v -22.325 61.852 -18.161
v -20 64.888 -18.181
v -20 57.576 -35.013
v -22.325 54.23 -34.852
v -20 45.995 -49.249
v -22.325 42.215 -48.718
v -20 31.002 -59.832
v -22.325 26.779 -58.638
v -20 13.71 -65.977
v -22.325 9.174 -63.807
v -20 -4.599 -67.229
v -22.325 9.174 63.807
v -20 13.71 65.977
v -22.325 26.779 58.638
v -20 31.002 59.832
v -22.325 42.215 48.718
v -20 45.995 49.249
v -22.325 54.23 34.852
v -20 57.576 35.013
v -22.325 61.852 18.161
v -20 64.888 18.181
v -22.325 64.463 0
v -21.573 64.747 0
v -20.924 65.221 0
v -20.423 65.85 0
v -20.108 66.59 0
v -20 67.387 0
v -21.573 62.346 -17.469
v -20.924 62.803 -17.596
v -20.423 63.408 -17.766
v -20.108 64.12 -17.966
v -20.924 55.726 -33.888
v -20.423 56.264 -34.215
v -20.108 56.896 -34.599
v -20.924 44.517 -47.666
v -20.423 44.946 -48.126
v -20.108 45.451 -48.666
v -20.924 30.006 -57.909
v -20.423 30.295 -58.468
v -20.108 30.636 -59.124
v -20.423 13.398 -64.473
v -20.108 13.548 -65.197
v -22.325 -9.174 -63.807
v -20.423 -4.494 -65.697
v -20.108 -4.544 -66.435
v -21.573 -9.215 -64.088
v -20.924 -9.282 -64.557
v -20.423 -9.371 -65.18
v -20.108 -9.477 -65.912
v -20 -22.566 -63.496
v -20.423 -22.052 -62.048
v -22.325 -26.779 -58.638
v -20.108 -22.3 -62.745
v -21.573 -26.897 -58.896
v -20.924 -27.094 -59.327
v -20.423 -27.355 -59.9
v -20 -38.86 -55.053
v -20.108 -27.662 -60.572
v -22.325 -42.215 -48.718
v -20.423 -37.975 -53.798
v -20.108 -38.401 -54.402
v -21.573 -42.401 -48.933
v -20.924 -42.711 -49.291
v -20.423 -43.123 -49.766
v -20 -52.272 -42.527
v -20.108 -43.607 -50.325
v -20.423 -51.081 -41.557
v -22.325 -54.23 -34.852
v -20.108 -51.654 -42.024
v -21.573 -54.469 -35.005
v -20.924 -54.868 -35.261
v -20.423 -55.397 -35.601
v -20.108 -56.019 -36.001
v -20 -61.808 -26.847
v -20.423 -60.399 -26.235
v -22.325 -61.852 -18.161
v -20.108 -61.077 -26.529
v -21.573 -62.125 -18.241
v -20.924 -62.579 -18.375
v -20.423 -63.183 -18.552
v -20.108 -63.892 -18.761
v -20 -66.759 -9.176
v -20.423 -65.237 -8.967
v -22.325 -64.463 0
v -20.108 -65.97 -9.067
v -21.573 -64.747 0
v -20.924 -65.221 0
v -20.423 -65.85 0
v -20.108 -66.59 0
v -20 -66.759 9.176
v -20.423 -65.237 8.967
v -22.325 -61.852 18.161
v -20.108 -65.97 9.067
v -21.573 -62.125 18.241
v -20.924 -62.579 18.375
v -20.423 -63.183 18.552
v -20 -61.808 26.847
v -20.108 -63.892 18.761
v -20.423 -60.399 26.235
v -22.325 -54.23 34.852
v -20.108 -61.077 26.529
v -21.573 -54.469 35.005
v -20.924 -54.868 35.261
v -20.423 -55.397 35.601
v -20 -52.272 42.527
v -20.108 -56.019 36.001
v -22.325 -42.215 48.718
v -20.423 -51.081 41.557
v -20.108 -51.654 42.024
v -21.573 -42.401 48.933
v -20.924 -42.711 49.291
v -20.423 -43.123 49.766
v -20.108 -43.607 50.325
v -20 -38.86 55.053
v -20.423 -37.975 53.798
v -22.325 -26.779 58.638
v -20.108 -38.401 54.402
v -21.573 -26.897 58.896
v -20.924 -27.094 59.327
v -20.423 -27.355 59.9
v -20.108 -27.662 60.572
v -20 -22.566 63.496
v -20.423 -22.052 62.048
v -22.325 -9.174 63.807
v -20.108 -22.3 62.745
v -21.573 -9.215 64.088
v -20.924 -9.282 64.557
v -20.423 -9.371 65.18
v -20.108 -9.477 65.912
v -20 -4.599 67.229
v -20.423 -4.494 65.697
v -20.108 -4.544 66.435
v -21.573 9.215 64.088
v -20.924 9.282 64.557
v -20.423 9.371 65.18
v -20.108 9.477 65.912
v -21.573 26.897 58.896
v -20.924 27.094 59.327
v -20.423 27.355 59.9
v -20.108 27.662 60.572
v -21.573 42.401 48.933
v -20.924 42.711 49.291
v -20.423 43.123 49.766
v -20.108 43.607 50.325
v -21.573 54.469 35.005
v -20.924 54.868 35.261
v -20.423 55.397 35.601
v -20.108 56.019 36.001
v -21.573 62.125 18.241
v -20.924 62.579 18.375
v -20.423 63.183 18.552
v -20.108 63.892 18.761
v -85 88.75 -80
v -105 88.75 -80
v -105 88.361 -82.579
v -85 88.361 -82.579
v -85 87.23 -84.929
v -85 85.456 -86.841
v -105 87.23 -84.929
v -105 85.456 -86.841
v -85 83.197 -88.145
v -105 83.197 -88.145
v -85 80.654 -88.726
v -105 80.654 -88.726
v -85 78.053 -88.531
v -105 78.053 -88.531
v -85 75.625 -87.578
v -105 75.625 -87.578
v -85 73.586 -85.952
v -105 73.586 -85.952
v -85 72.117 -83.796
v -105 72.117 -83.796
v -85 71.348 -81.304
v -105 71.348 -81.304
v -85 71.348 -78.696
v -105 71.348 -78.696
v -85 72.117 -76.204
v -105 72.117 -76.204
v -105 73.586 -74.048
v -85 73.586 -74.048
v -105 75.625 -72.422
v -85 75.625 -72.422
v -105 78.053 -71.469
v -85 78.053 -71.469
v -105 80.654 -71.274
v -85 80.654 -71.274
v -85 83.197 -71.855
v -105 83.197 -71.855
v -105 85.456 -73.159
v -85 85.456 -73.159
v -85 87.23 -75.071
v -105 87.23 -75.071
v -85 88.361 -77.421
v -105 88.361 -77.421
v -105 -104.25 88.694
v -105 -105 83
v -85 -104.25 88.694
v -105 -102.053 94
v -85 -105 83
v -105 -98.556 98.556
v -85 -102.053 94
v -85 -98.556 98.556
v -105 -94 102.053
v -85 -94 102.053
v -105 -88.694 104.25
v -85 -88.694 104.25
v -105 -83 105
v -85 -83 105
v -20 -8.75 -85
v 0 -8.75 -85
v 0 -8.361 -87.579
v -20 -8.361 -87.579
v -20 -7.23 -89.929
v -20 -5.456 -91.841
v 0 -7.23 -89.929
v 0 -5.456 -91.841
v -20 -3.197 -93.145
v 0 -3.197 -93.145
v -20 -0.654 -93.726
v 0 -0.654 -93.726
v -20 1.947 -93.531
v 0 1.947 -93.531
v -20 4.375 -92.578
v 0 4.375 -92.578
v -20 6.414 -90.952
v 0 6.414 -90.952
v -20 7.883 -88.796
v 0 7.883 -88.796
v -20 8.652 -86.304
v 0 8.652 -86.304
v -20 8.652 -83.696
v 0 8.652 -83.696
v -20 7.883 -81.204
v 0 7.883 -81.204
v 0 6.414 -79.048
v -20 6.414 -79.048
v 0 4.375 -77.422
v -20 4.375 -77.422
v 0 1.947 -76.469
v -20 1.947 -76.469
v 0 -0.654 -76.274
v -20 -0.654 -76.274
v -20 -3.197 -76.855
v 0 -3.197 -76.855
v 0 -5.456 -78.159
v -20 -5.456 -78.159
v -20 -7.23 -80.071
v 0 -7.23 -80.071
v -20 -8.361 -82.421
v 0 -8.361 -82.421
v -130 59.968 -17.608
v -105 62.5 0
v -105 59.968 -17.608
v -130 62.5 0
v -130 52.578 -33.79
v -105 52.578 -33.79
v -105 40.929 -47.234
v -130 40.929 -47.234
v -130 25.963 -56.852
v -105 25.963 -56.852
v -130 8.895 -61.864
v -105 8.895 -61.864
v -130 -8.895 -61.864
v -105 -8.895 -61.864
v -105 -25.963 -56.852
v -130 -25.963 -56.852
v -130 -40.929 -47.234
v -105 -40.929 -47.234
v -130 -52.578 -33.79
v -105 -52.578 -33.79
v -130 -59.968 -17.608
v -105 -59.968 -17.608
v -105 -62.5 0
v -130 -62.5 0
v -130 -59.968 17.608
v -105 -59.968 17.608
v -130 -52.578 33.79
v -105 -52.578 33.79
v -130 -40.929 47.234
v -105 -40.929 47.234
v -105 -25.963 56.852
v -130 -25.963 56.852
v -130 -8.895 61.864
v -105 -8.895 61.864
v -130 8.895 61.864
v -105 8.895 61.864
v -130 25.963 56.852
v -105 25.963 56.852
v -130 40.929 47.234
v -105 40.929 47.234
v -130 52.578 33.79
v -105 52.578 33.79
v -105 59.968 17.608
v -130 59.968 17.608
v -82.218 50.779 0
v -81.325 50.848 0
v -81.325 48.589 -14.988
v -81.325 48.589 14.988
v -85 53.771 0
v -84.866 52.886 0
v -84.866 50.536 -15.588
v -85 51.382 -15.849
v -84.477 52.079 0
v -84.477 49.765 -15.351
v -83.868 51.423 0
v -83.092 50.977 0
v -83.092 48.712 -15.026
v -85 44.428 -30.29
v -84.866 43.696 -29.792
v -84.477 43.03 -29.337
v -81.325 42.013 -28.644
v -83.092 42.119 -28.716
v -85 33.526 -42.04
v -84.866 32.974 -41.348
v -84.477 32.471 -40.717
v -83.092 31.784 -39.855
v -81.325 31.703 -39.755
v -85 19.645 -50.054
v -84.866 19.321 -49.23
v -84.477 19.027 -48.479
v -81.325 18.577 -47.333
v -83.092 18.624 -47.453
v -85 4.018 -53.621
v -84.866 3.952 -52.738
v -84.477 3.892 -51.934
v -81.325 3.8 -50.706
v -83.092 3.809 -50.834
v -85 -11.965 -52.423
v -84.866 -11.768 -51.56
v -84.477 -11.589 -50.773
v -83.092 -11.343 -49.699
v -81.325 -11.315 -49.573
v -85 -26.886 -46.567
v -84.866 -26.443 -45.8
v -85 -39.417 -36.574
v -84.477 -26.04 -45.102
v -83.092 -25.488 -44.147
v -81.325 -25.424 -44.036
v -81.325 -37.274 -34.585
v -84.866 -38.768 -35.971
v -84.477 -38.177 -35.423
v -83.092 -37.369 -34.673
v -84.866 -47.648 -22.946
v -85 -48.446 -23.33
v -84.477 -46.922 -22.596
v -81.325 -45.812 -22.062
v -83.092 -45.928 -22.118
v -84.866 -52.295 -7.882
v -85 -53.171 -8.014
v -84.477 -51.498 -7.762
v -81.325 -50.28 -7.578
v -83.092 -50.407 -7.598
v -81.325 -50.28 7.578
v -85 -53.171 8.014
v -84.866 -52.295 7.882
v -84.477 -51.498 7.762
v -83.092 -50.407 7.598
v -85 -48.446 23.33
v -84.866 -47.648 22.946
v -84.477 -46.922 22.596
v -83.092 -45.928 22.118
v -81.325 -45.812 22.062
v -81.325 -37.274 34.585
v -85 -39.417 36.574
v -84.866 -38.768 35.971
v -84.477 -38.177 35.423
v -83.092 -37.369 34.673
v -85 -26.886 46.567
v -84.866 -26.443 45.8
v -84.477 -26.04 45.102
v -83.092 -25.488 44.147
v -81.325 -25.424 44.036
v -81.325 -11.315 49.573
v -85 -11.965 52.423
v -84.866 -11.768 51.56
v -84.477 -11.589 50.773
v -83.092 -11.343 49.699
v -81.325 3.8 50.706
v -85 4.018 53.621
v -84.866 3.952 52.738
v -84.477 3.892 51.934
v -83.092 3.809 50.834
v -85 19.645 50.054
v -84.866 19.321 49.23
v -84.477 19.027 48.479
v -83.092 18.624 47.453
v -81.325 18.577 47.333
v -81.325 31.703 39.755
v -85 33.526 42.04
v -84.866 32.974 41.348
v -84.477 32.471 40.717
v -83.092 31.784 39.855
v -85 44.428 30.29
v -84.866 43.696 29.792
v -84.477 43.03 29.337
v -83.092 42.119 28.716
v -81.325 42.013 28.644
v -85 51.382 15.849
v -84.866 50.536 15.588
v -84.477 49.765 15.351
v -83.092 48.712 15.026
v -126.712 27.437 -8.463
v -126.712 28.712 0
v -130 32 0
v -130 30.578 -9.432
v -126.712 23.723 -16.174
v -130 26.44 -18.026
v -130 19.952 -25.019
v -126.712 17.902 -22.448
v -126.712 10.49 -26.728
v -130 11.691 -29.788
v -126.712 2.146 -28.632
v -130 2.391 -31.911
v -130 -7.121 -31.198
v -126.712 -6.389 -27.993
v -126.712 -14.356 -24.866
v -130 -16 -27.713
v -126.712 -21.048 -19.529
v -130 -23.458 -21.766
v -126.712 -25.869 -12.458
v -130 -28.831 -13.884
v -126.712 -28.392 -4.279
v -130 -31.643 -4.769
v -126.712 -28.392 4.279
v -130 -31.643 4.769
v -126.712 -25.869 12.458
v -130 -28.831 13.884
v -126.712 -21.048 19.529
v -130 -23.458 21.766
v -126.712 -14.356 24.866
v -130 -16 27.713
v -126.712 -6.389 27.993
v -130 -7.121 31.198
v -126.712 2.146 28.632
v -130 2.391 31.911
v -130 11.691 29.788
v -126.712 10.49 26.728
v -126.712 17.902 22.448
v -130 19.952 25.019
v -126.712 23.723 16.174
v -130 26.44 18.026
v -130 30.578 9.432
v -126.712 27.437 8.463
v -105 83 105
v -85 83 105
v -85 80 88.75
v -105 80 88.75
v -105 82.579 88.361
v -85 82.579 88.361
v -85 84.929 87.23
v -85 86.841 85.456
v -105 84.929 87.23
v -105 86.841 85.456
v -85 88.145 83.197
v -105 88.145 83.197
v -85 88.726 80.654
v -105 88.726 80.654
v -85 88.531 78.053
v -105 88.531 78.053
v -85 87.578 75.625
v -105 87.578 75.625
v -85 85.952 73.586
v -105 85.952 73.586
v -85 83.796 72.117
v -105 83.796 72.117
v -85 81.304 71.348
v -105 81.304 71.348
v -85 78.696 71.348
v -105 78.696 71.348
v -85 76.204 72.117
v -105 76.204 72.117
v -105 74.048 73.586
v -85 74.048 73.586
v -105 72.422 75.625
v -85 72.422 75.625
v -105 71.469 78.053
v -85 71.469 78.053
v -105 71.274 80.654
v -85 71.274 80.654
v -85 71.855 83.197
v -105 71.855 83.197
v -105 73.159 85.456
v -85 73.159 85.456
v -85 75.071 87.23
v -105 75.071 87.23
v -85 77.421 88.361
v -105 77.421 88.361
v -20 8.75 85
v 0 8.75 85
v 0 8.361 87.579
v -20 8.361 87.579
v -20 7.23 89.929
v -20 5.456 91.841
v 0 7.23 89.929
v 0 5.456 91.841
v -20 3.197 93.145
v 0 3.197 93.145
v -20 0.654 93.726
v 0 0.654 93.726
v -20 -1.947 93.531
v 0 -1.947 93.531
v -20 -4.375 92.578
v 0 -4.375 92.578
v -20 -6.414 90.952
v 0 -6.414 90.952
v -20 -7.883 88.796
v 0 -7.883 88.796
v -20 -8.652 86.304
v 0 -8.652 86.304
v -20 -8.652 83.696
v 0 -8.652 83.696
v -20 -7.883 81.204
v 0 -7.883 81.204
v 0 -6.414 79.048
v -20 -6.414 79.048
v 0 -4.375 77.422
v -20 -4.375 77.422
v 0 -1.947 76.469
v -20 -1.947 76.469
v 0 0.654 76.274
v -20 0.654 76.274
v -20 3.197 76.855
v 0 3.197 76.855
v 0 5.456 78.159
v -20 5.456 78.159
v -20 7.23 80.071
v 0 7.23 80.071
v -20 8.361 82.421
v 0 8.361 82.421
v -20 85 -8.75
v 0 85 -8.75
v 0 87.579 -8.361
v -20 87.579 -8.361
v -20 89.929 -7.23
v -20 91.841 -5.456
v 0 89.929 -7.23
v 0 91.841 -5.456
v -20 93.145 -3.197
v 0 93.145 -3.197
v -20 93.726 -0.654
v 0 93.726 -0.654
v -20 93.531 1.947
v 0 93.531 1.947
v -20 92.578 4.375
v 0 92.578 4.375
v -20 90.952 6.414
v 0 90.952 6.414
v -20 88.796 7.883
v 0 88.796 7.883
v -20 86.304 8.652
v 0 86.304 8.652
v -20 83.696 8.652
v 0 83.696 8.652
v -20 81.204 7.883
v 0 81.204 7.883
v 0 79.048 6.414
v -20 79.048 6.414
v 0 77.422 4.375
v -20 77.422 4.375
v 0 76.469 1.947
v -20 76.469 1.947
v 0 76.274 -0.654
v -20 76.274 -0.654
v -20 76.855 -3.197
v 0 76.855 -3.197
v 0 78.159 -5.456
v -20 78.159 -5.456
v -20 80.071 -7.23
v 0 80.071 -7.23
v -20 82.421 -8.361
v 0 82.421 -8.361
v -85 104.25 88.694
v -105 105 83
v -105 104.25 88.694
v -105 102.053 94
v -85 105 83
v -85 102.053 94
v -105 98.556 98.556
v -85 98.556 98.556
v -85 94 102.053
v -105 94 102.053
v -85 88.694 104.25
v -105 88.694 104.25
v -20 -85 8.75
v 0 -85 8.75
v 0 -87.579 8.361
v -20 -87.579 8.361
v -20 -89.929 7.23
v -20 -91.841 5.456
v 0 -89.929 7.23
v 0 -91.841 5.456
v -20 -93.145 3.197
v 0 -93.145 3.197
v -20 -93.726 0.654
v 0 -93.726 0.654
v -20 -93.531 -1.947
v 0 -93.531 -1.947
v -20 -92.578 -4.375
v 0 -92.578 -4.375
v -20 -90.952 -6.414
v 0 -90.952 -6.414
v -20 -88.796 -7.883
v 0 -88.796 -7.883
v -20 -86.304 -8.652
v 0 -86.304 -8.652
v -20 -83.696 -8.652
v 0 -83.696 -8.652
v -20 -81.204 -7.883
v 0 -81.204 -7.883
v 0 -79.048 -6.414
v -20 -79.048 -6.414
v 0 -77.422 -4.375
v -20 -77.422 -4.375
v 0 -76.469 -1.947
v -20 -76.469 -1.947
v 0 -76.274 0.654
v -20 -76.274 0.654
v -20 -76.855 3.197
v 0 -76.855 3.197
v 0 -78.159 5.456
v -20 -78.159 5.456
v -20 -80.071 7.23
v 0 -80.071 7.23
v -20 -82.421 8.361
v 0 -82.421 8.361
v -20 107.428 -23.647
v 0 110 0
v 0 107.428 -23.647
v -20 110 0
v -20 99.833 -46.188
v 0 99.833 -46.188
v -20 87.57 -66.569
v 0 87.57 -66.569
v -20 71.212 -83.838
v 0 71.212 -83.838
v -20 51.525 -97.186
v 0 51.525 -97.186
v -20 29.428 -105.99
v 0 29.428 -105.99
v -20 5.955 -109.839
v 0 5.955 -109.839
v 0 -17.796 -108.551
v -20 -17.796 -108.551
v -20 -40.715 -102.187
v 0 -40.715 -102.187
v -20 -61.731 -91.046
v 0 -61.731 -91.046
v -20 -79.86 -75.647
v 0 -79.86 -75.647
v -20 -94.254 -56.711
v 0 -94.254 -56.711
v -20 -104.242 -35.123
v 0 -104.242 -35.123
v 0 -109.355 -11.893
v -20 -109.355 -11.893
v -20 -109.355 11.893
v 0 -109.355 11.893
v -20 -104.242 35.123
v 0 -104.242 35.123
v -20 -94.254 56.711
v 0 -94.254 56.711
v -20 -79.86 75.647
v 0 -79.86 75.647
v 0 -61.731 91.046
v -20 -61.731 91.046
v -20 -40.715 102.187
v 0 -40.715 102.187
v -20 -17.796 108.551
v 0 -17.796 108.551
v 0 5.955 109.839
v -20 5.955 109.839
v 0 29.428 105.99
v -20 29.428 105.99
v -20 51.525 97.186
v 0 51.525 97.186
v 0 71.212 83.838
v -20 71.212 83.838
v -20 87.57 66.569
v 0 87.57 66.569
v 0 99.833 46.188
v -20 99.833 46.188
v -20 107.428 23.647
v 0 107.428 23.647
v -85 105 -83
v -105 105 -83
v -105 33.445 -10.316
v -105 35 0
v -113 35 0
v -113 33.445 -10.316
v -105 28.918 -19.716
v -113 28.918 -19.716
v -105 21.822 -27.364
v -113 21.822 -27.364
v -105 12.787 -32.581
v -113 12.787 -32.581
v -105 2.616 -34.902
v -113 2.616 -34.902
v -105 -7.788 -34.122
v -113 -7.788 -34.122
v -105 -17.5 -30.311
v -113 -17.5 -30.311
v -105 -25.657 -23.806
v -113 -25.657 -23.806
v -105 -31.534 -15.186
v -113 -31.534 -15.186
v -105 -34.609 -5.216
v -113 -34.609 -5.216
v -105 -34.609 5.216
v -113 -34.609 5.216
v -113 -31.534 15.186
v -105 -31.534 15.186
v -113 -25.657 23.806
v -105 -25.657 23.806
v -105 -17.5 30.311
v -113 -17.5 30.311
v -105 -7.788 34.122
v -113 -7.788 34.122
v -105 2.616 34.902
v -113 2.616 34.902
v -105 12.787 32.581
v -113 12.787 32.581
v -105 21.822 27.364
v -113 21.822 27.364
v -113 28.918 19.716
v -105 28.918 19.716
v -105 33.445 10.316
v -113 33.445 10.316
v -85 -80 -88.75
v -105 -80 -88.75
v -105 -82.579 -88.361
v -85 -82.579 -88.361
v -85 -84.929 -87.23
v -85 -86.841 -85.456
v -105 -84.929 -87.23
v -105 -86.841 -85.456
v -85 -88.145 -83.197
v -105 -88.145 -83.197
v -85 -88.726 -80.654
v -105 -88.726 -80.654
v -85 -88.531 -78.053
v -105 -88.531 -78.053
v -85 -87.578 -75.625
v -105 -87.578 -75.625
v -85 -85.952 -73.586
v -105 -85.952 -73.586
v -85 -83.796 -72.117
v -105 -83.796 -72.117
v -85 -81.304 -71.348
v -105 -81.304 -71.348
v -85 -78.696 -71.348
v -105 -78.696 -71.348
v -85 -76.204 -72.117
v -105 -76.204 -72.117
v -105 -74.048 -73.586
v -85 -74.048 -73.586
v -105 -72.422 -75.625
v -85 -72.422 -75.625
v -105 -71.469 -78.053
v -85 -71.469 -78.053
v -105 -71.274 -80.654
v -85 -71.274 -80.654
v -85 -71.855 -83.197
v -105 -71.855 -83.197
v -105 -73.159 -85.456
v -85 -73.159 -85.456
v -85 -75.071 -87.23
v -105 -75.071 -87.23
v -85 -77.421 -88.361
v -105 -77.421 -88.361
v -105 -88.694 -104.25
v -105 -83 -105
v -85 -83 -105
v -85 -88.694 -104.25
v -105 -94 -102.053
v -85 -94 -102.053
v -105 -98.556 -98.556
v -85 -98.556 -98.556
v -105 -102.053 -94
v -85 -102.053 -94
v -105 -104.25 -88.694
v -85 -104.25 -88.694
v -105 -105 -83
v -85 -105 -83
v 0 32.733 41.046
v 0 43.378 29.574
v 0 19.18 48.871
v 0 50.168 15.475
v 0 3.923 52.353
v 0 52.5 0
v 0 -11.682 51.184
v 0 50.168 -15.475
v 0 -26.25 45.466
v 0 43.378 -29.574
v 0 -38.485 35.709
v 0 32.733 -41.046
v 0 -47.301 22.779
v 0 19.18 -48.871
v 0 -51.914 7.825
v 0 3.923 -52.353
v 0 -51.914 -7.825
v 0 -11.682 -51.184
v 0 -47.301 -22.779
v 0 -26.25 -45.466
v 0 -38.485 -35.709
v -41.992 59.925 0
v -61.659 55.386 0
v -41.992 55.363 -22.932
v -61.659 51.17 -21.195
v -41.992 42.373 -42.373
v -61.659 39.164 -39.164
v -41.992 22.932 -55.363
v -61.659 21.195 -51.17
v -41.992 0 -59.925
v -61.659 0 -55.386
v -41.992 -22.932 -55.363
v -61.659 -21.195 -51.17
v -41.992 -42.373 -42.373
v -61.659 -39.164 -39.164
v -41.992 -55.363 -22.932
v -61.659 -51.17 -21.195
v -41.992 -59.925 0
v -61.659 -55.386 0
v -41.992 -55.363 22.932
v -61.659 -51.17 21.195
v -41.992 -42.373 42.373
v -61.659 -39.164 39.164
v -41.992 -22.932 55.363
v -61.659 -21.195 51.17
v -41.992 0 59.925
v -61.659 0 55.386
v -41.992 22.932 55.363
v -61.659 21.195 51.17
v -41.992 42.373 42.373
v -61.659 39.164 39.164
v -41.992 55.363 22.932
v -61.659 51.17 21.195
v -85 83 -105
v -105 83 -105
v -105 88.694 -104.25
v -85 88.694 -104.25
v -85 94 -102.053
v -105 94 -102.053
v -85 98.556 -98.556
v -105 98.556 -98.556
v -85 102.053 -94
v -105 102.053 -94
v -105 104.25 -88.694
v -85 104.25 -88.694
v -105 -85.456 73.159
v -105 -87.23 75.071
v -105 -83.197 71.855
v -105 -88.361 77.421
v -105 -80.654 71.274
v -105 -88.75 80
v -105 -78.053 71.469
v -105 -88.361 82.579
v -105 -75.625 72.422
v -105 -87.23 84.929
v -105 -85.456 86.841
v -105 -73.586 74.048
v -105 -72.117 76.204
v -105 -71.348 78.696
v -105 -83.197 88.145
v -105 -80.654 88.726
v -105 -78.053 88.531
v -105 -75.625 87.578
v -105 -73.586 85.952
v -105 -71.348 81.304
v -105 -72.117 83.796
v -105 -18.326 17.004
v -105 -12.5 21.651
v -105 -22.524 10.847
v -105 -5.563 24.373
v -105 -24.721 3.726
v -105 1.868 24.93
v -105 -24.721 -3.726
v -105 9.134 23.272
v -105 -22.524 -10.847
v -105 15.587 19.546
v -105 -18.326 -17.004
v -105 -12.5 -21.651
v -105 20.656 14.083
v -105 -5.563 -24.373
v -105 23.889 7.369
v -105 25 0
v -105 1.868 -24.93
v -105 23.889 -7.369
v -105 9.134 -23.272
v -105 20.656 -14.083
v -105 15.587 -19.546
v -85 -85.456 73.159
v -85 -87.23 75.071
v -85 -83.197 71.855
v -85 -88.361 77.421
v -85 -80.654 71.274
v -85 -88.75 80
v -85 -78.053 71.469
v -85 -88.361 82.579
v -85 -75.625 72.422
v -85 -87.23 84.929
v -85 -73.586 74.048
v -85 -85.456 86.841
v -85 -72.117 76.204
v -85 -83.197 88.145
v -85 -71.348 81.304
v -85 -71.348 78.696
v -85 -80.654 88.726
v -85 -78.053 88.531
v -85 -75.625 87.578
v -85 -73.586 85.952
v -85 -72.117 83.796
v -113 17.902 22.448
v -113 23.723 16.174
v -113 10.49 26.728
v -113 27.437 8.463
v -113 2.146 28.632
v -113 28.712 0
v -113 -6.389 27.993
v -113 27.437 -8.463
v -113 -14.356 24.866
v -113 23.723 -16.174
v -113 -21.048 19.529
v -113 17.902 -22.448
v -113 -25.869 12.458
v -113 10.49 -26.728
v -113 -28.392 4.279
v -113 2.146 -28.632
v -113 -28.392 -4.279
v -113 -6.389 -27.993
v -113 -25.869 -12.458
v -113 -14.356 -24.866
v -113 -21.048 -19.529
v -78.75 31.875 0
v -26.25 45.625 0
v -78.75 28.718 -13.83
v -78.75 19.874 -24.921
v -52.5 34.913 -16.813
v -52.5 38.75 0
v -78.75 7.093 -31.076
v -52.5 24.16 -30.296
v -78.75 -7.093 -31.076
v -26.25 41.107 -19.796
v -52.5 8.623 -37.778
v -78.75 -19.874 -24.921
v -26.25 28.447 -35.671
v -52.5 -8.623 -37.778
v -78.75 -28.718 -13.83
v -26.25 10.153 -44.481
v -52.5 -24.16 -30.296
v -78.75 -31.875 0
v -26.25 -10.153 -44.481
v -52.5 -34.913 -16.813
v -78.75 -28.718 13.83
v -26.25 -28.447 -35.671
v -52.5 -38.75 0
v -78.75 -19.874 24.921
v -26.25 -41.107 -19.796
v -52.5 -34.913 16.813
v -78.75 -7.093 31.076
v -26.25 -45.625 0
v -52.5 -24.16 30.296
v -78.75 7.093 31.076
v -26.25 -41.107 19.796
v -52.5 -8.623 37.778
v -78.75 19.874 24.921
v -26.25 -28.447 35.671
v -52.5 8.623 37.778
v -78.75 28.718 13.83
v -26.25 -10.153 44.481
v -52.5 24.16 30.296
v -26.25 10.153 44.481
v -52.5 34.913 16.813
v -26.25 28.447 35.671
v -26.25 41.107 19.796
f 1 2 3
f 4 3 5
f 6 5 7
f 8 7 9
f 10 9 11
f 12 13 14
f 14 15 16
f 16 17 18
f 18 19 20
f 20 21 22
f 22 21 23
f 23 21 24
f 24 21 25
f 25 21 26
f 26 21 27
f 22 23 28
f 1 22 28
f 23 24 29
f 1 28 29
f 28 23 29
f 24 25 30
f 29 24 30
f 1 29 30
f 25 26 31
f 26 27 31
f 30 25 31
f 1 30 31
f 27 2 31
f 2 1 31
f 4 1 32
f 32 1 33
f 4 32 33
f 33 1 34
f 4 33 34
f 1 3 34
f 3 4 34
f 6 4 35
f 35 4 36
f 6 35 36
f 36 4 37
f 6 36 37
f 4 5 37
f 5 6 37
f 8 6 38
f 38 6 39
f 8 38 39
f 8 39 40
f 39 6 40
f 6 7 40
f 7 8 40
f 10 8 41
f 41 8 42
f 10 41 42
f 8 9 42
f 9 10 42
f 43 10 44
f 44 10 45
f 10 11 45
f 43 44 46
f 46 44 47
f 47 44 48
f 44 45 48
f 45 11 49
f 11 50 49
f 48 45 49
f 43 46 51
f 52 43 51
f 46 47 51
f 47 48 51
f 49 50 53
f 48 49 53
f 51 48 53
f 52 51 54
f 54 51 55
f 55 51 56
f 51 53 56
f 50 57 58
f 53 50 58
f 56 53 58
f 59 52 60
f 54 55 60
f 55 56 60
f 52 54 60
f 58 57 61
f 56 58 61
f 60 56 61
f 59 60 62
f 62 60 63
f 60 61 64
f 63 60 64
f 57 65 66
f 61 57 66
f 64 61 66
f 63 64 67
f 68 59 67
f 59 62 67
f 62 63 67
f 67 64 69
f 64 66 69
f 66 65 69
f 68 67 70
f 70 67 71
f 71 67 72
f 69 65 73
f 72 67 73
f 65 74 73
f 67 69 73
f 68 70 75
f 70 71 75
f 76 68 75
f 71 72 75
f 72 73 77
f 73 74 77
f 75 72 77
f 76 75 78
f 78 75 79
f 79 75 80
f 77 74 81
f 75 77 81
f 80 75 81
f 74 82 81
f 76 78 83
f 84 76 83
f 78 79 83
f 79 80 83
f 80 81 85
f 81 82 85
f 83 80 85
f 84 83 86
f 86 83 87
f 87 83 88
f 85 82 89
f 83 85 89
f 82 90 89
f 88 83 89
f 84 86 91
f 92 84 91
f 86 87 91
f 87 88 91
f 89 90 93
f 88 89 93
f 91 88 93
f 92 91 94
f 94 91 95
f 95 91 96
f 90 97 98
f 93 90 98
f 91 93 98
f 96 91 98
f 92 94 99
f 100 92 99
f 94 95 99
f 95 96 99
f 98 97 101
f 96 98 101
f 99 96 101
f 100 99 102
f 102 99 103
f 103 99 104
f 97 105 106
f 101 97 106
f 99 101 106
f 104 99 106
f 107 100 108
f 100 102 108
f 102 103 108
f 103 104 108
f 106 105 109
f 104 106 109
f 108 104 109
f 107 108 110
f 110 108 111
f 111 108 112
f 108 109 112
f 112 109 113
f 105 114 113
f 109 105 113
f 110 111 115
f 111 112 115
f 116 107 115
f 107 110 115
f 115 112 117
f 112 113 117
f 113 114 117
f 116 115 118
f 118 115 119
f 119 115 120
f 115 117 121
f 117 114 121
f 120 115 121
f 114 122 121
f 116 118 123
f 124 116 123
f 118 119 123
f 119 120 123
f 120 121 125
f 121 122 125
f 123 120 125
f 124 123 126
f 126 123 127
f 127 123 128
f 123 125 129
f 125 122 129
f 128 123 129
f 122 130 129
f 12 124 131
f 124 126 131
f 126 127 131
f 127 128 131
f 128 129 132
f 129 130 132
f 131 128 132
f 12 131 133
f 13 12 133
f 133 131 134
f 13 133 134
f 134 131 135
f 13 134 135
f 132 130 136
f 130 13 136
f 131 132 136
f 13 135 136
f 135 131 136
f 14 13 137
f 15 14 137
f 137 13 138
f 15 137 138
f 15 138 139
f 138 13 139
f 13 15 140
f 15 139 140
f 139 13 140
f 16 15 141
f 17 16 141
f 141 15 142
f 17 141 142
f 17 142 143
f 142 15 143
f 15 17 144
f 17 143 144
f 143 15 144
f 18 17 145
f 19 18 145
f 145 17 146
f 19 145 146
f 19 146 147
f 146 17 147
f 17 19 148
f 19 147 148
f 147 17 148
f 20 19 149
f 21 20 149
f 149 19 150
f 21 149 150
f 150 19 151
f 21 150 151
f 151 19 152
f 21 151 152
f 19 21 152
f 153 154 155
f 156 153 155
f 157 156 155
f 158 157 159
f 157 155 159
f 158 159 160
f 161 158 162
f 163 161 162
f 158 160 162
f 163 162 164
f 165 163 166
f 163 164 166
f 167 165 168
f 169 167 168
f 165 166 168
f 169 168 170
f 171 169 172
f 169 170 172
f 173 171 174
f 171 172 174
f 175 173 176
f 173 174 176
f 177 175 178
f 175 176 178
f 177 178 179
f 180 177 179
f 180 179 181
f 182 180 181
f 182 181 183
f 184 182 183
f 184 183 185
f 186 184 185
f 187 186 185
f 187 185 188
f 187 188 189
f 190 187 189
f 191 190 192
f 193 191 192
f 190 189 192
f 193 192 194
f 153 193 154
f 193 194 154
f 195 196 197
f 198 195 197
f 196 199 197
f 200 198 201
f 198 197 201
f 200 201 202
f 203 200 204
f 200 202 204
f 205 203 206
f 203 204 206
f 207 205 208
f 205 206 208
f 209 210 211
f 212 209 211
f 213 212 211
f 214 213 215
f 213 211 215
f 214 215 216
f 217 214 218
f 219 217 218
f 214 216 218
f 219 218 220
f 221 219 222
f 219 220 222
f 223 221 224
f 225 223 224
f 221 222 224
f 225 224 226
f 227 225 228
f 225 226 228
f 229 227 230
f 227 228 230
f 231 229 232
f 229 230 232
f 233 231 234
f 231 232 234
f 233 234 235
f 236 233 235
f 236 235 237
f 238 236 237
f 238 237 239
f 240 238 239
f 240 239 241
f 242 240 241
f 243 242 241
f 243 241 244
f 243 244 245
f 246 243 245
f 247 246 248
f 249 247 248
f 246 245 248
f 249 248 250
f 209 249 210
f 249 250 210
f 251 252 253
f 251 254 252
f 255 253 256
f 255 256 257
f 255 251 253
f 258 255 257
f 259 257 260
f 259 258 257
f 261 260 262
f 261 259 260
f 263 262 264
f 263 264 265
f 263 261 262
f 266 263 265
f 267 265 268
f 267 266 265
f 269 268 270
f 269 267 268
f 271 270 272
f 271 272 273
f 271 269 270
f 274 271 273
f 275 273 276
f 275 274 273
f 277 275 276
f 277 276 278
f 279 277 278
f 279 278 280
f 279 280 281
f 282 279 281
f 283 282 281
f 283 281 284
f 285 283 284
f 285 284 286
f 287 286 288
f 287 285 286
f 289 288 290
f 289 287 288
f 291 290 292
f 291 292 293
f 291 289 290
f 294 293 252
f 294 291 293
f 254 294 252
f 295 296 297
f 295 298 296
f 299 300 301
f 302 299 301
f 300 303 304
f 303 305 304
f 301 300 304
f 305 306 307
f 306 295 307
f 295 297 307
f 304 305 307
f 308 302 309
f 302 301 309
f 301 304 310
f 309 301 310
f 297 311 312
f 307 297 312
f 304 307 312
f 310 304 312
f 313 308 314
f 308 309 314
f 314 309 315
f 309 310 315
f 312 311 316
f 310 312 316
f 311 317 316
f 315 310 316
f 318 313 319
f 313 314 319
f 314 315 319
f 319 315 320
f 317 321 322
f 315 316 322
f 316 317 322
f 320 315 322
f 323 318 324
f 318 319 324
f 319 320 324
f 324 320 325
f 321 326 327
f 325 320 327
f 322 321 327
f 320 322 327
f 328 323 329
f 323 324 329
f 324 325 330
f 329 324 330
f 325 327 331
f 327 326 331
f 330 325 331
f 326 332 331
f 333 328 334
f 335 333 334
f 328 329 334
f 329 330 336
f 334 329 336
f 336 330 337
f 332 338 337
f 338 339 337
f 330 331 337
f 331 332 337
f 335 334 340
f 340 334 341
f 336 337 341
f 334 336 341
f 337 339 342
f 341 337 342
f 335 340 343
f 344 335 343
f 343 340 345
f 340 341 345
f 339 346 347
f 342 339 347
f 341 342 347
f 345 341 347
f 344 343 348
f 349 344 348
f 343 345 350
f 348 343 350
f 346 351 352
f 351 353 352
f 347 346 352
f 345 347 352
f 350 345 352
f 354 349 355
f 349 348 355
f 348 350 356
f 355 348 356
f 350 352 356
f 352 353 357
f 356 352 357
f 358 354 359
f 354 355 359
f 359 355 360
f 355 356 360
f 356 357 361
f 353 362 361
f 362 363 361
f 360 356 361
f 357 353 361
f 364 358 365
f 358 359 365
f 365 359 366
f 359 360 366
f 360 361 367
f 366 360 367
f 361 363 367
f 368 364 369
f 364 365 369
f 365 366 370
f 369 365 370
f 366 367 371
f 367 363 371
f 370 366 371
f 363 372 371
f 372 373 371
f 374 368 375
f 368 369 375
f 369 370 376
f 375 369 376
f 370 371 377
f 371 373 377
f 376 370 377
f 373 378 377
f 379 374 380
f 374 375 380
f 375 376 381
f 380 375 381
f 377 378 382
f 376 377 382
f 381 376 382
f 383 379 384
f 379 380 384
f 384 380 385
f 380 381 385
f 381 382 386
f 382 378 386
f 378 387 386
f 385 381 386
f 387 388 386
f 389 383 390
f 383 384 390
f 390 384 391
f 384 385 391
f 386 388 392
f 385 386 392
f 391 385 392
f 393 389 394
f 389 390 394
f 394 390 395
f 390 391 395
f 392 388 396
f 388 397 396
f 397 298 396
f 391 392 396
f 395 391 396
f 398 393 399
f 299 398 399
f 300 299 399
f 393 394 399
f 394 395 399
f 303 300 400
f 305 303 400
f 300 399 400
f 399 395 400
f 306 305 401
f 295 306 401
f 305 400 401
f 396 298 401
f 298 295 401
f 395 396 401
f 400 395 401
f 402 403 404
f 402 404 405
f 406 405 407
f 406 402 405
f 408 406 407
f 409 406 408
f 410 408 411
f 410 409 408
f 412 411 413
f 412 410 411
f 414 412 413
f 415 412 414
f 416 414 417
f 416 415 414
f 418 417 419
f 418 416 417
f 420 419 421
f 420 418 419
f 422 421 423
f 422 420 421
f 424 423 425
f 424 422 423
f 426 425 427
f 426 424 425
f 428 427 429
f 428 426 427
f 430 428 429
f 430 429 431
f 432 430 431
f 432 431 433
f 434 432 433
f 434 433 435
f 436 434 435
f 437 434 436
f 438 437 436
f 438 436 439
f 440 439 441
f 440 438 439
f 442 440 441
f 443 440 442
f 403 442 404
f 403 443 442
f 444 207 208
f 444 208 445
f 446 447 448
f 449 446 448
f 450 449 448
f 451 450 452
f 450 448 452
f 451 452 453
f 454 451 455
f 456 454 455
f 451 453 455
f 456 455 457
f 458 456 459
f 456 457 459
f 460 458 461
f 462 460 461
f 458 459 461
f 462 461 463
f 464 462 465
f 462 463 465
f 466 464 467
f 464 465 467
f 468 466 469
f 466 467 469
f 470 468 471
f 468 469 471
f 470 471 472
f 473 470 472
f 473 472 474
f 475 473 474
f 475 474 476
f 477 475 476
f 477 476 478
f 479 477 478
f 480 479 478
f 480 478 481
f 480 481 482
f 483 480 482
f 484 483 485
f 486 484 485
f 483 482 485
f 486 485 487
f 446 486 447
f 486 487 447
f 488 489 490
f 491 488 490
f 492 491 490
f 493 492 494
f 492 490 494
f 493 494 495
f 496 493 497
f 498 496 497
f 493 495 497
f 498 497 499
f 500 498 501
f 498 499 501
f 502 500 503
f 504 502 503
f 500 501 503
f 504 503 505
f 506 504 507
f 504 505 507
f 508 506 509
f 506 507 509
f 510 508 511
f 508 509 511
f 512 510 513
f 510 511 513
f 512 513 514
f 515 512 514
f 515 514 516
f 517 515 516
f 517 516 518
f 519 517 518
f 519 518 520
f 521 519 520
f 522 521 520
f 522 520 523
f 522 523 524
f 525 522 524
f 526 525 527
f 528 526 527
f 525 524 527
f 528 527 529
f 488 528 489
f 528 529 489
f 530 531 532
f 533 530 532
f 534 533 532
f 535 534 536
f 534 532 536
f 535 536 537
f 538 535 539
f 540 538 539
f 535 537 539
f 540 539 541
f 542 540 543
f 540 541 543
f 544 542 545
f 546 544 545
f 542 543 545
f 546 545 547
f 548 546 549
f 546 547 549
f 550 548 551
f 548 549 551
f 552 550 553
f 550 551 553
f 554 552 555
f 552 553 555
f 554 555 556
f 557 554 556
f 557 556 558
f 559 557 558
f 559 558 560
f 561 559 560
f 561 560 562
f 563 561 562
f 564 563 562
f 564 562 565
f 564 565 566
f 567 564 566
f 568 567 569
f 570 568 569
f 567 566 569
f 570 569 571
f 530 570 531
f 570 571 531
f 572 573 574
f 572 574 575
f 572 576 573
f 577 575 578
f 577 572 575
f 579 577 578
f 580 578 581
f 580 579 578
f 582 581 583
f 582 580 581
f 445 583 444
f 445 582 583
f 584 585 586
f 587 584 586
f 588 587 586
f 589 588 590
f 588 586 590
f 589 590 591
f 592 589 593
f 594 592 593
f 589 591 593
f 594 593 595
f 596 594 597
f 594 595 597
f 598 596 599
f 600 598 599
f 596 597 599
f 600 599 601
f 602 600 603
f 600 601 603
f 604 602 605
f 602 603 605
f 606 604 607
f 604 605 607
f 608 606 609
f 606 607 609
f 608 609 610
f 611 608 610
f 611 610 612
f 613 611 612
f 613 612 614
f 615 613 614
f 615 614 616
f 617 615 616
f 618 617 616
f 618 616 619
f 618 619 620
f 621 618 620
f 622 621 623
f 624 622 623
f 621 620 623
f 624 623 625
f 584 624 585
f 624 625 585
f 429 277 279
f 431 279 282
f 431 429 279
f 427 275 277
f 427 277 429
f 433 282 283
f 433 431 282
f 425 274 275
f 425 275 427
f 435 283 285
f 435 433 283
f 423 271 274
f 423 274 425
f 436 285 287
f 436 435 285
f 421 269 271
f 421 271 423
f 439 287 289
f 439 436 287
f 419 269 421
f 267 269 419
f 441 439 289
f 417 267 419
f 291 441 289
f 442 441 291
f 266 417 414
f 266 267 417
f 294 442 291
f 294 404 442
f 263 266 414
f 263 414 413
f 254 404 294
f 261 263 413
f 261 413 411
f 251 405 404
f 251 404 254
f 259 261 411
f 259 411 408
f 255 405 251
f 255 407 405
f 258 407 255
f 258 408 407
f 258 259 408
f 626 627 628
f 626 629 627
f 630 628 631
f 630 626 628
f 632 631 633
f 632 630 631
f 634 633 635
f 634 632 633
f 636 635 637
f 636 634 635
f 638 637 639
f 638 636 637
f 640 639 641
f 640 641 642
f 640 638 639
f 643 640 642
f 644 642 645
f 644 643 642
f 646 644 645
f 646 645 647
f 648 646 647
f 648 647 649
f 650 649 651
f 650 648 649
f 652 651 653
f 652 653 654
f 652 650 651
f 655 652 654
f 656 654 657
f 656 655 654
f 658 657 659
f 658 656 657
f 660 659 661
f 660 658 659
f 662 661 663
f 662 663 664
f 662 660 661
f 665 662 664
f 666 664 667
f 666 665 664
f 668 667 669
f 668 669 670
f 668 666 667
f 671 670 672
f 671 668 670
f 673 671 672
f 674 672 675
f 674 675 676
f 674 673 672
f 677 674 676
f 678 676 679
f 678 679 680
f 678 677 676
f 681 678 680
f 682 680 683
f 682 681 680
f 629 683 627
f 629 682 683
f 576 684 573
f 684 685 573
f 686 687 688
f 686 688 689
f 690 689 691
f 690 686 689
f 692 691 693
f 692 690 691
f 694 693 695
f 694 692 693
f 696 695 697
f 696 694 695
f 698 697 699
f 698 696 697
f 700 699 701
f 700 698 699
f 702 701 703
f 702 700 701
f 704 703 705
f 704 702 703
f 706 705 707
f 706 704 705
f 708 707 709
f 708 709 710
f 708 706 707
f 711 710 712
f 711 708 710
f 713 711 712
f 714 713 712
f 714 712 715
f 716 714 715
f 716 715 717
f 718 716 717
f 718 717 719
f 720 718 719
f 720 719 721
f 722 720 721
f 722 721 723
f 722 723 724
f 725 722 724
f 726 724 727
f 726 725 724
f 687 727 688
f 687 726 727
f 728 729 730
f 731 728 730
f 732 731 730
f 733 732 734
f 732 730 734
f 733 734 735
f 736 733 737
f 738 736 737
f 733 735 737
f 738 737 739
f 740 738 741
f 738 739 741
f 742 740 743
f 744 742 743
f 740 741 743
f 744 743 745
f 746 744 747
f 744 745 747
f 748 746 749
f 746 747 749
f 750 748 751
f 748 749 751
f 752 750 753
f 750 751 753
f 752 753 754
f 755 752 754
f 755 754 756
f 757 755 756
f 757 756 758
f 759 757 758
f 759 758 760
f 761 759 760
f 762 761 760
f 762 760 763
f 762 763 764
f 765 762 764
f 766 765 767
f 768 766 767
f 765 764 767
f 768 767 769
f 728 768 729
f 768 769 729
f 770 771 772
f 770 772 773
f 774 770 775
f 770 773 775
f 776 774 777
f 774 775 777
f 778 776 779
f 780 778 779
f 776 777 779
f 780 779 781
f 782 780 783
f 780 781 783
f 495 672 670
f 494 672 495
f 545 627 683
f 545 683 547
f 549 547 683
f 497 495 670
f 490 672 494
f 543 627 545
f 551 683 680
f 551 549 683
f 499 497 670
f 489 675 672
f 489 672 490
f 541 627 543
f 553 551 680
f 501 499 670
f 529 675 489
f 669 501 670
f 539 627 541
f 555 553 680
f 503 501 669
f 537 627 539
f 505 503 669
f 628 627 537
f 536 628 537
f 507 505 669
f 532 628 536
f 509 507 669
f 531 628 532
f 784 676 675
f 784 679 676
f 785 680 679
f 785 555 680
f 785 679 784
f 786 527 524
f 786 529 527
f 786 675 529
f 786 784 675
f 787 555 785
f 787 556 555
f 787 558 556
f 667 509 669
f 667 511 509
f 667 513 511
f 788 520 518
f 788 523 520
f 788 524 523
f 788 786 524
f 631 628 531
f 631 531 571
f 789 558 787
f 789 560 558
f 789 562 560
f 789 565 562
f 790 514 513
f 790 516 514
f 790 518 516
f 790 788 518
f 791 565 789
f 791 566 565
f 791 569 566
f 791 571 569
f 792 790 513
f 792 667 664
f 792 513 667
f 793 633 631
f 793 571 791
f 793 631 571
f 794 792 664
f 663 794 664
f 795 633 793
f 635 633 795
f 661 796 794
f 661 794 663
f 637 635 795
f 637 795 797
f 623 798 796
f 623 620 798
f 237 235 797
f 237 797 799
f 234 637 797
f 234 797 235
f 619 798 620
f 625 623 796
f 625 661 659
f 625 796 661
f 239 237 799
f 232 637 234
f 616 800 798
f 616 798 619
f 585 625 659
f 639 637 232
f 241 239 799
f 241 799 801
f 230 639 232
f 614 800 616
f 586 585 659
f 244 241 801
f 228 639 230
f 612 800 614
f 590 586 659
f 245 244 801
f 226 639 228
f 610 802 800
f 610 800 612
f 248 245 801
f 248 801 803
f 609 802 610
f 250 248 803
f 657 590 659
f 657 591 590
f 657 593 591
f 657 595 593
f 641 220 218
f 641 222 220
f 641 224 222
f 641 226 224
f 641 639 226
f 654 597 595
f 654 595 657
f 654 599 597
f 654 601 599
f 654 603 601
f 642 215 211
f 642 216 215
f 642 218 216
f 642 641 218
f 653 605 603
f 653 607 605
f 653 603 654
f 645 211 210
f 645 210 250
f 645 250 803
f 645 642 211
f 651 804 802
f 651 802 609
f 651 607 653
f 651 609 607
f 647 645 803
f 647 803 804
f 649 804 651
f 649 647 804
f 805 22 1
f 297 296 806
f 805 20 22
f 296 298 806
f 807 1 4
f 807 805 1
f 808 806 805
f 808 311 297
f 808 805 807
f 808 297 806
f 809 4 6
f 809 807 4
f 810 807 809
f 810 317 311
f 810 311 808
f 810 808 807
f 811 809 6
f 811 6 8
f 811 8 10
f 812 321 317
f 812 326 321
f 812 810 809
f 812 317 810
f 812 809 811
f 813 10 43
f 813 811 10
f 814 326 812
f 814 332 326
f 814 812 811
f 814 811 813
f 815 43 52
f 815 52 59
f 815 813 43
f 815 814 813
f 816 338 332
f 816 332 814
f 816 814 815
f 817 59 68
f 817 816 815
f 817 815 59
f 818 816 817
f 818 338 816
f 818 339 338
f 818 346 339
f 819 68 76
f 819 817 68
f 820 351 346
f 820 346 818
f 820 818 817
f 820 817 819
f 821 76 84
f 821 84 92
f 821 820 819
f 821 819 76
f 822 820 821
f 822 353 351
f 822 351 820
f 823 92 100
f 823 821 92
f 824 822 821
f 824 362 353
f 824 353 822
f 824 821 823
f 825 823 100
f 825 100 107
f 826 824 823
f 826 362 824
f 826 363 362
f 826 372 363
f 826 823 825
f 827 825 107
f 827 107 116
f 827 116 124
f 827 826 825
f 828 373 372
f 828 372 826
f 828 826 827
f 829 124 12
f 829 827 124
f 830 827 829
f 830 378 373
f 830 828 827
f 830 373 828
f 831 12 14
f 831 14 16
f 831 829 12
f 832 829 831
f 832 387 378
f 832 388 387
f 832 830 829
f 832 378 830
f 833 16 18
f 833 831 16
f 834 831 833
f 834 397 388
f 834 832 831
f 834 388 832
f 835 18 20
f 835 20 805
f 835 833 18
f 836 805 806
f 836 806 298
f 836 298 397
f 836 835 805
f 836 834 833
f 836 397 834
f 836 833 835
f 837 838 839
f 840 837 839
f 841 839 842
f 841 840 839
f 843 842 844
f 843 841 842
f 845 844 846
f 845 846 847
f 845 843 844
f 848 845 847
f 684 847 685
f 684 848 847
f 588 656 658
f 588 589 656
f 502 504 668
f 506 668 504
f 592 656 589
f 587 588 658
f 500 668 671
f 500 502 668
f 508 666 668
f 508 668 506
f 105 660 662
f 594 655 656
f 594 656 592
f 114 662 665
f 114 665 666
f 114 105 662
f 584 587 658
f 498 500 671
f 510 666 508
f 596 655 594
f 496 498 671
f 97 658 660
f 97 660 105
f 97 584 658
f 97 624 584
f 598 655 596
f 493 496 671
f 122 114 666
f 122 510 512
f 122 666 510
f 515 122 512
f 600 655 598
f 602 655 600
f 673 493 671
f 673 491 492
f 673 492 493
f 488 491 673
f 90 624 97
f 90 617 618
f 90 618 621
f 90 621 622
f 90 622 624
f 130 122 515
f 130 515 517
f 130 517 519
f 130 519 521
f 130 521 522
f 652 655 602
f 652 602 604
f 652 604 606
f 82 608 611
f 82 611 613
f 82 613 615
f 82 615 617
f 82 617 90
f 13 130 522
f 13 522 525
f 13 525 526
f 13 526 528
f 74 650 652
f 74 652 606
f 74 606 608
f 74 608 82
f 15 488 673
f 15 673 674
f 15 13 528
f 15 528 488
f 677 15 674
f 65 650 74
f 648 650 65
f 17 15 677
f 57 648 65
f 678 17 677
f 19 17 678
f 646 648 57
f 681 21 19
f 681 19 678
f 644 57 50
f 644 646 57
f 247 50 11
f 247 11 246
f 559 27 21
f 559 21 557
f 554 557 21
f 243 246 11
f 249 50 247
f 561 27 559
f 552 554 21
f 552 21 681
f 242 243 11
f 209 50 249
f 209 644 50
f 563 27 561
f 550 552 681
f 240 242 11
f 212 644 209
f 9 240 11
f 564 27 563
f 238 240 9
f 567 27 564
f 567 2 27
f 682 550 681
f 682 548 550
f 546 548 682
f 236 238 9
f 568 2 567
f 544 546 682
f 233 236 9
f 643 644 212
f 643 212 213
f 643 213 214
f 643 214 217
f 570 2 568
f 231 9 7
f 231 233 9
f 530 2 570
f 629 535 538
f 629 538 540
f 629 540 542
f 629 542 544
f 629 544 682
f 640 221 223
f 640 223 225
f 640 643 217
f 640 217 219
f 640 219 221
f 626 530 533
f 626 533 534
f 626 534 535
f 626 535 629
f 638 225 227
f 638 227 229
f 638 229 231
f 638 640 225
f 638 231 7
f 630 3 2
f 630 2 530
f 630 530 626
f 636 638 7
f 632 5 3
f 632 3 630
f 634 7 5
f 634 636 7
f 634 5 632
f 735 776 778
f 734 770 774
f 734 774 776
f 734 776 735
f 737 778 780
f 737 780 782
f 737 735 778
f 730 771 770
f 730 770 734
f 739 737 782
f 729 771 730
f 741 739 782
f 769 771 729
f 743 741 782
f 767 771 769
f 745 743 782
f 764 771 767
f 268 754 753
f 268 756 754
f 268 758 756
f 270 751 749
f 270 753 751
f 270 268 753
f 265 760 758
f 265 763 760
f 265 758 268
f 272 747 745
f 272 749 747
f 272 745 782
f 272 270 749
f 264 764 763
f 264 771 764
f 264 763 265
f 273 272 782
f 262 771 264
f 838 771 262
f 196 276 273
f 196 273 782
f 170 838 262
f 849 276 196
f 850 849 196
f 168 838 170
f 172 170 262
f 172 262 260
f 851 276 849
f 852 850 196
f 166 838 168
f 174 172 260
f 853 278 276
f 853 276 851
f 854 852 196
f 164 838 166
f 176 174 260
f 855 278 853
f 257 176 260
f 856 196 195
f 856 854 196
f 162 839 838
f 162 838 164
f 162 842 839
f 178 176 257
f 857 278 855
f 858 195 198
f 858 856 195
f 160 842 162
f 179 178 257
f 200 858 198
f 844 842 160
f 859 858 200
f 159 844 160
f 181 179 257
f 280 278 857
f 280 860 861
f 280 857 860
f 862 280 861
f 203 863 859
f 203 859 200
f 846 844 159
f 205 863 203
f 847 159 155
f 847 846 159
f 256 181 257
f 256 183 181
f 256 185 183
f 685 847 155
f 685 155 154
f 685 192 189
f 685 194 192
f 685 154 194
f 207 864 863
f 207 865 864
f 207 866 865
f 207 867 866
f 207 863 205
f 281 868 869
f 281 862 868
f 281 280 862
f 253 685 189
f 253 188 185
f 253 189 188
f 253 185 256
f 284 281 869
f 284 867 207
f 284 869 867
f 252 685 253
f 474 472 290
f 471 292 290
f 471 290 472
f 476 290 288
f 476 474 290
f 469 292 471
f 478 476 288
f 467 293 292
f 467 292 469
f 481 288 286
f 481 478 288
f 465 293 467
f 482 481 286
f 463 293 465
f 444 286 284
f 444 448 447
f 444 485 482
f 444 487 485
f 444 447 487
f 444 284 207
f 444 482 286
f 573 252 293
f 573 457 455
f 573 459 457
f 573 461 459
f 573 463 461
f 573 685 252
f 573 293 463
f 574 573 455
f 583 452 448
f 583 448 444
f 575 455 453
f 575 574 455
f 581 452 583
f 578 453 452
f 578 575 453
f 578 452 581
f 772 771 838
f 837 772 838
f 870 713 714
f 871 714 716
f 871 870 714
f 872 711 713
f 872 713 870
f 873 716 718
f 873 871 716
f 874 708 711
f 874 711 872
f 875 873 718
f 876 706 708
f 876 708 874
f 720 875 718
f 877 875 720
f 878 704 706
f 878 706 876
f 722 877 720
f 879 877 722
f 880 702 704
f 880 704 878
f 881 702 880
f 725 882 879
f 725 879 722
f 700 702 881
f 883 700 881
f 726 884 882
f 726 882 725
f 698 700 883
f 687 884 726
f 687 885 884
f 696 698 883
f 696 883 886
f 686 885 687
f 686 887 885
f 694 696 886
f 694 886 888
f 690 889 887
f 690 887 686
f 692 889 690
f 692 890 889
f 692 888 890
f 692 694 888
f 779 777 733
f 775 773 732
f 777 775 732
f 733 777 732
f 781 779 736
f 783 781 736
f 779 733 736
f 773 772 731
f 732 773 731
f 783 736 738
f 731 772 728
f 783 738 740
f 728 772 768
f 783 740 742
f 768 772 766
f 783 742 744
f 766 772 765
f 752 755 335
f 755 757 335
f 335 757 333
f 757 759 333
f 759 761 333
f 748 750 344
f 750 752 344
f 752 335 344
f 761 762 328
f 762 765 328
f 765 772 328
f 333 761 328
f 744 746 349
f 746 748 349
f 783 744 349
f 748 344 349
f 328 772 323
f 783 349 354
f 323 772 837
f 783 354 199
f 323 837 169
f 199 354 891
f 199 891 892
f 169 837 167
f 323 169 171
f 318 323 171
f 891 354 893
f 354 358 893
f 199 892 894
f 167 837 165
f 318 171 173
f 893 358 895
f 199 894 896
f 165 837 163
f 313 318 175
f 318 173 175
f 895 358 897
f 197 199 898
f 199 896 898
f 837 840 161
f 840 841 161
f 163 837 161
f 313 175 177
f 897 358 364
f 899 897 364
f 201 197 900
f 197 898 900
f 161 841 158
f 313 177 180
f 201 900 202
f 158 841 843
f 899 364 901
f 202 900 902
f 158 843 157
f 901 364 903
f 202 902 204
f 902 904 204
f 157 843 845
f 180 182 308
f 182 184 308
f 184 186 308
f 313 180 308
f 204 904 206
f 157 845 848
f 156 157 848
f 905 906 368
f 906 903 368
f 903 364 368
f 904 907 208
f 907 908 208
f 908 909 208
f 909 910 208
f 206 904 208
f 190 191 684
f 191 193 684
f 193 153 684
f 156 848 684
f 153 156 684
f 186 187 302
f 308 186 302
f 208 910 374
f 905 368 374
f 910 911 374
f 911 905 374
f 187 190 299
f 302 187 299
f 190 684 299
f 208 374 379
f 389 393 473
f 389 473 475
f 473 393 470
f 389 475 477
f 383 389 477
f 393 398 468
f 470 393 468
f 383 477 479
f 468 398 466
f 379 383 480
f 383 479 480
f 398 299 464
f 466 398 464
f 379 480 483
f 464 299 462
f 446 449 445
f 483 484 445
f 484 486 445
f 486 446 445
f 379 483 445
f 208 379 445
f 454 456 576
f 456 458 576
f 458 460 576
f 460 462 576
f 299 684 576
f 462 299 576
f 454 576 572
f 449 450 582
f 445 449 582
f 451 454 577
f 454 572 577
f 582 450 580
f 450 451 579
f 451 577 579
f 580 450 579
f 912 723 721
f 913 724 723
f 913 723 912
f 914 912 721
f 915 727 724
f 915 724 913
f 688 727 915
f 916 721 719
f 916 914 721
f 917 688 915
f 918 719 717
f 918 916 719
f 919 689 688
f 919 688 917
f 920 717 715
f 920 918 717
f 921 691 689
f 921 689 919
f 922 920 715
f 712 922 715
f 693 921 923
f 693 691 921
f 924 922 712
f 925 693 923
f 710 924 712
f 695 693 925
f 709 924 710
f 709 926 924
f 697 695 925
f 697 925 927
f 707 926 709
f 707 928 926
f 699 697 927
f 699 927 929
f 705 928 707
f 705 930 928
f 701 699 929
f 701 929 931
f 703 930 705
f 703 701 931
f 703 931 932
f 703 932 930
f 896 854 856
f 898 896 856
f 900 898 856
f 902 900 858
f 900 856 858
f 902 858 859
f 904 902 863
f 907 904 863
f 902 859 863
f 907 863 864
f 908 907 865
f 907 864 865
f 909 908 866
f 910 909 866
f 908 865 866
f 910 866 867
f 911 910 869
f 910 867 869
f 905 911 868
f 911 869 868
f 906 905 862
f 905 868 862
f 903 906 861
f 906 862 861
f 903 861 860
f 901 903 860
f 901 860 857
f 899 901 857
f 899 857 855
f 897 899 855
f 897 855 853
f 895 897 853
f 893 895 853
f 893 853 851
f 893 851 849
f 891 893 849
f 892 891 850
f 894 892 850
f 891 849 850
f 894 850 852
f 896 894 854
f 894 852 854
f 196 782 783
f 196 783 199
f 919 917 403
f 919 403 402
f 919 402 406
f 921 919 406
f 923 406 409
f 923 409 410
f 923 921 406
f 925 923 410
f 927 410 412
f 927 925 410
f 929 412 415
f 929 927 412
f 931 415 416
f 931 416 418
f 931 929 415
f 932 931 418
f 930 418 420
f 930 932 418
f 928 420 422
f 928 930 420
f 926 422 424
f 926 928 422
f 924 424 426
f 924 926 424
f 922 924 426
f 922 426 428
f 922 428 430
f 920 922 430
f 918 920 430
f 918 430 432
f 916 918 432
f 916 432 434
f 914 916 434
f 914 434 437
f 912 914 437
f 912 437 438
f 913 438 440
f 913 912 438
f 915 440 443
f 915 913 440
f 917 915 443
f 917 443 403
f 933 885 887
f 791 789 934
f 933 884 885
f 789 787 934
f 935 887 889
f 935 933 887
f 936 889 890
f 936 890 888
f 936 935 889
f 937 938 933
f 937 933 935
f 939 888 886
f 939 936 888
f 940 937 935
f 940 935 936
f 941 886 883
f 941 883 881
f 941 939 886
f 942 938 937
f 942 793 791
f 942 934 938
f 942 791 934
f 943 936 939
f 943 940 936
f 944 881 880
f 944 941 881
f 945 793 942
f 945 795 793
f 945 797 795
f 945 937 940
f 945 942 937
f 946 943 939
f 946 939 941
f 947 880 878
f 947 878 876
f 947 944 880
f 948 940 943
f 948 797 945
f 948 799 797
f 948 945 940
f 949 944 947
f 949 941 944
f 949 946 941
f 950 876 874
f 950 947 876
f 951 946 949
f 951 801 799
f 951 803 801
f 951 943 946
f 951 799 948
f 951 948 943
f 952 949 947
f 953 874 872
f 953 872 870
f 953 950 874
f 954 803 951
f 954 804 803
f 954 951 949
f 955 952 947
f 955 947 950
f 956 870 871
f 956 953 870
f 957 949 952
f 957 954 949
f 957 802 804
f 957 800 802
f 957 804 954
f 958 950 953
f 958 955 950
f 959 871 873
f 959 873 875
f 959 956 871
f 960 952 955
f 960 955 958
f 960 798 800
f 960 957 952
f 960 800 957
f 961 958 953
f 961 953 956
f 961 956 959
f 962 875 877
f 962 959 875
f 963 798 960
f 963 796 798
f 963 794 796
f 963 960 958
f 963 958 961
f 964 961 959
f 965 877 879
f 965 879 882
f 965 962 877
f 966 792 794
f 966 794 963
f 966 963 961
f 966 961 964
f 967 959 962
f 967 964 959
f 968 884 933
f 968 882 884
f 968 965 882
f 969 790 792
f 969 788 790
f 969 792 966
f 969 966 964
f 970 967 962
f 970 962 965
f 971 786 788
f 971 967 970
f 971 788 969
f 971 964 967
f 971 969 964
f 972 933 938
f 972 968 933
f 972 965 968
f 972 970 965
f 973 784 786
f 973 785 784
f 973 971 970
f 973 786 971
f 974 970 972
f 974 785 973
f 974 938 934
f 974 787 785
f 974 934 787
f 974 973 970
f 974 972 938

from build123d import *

# Parameters (mm, degrees)
SKETCH_2_R               = 8.75
CUT_EXTRUDE_1_DEPTH      = 20
PATTERN_CIRCULAR_1_COUNT = 4
SKETCH_3_W               = 210
SKETCH_3_H               = 210
SKETCH_3_R               = 35
EXTRUDE_1_DEPTH          = 20
SKETCH_4_R               = 8.75
CUT_EXTRUDE_2_DEPTH      = 20
FILLET_1_R               = 22
PATTERN_CIRCULAR_5_COUNT = 4
CHAMFER_1_SIZE           = 3.2875
FILLET_2_R               = 3


with BuildPart() as part:
    # Эскиз1 → Повернуть1 (revolve)
    with BuildSketch(Plane.XY):
        Polygon((0, 52.5), (0, 110), (-20, 110), (-20, 65), (-85, 50), (-85, 105), (-105, 105), (-105, 62.5), (-130, 62.5), (-130, 28.7125), (-113, 28.7125), (-113, 35), (-105, 35), (-105, 25), align=None)
    revolve(axis=Axis((0, 0, 0), (-1, 0, 0)))

    # Эскиз2 → Вырез-Вытянуть1 (cut)
    with BuildSketch(Plane(origin=(0, 0, 0), x_dir=(0, 0, -1), z_dir=(1, 0, 0))):
        with Locations((0, 85)):
            Circle(SKETCH_2_R)
    cut_extrude_1 = extrude(amount=-CUT_EXTRUDE_1_DEPTH, mode=Mode.SUBTRACT)

    # Круговой массив1: Вырез-Вытянуть1 ×4 about axis
    pattern_circular_1_axis = Axis((0, 0, 0), (1, 0, 0))
    for i in range(1, PATTERN_CIRCULAR_1_COUNT):
        add(cut_extrude_1.rotate(pattern_circular_1_axis, i * 360 / PATTERN_CIRCULAR_1_COUNT), mode=Mode.SUBTRACT)

    # Эскиз3 → Бобышка-Вытянуть1 (add)
    with BuildSketch(Plane.ZY.offset(105)):
        Rectangle(SKETCH_3_W, SKETCH_3_H)
        Circle(SKETCH_3_R, mode=Mode.SUBTRACT)
    extrude(amount=-EXTRUDE_1_DEPTH)

    # Эскиз4 → Вырез-Вытянуть2 (cut)
    with BuildSketch(Plane.ZY.offset(105)):
        with Locations((80, 80)):
            Circle(SKETCH_4_R)
    cut_extrude_2 = extrude(amount=-CUT_EXTRUDE_2_DEPTH, mode=Mode.SUBTRACT)

    # Скругление1
    fillet_1_edges = [part.edges().sort_by_distance(p)[0] for p in [
        (-95, 105, 105),
        (-95, -105, 105),
        (-95, -105, -105),
        (-95, 105, -105),
    ]]
    fillet(fillet_1_edges, radius=FILLET_1_R)

    # Круговой массив5: Вырез-Вытянуть2 ×4 about axis
    pattern_circular_5_axis = Axis((0, 0, 0), (1, 0, 0))
    for i in range(1, PATTERN_CIRCULAR_5_COUNT):
        add(cut_extrude_2.rotate(pattern_circular_5_axis, i * 360 / PATTERN_CIRCULAR_5_COUNT), mode=Mode.SUBTRACT)

    # Фаска1
    chamfer_1_edges = [part.edges().sort_by_distance(p)[0] for p in [
        (-130, -28.7125, 0),
    ]]
    chamfer(chamfer_1_edges, length=CHAMFER_1_SIZE)

    # Скругление2
    fillet_2_edges = [part.edges().sort_by_distance(p)[0] for p in [
        (-20, -65, 0),
        (-85, -50, 0),
    ]]
    fillet(fillet_2_edges, radius=FILLET_2_R)


solid = part.part
